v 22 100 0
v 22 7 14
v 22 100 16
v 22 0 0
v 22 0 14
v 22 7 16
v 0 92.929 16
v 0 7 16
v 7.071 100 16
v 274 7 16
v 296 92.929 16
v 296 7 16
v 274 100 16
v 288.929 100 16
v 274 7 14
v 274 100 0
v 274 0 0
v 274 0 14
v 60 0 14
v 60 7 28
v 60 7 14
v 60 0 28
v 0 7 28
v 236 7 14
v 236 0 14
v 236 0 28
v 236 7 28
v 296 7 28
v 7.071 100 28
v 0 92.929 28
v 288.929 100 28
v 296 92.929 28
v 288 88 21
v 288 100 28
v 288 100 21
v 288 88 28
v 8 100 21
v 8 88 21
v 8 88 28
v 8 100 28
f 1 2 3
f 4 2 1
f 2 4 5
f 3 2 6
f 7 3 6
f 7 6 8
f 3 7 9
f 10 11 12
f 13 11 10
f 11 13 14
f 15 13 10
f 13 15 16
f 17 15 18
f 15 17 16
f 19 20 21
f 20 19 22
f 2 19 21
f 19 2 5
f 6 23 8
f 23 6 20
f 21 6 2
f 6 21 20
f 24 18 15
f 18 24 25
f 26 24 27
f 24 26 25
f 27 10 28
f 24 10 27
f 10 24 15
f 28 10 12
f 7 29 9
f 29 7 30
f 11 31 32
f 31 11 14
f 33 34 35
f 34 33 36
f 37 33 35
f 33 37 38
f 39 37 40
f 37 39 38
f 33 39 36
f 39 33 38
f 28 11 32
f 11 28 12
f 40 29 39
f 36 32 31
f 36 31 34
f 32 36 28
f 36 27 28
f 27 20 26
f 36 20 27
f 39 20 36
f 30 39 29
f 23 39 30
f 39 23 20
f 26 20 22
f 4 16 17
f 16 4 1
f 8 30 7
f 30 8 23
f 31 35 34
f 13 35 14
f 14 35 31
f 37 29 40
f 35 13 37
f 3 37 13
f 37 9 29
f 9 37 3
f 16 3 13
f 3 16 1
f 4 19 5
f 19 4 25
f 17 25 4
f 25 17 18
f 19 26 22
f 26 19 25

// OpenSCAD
include <../src/wardrobe.scad>;
plank_yx_side_bottom();
//github_openscad -o wardrobe_2/plank_yx_side_bottom.stl -D wardrobe_n=2 -D cutting_edge=0 -D break_view_length=0 wardrobe_2/plank_yx_side_bottom_stl.scad
